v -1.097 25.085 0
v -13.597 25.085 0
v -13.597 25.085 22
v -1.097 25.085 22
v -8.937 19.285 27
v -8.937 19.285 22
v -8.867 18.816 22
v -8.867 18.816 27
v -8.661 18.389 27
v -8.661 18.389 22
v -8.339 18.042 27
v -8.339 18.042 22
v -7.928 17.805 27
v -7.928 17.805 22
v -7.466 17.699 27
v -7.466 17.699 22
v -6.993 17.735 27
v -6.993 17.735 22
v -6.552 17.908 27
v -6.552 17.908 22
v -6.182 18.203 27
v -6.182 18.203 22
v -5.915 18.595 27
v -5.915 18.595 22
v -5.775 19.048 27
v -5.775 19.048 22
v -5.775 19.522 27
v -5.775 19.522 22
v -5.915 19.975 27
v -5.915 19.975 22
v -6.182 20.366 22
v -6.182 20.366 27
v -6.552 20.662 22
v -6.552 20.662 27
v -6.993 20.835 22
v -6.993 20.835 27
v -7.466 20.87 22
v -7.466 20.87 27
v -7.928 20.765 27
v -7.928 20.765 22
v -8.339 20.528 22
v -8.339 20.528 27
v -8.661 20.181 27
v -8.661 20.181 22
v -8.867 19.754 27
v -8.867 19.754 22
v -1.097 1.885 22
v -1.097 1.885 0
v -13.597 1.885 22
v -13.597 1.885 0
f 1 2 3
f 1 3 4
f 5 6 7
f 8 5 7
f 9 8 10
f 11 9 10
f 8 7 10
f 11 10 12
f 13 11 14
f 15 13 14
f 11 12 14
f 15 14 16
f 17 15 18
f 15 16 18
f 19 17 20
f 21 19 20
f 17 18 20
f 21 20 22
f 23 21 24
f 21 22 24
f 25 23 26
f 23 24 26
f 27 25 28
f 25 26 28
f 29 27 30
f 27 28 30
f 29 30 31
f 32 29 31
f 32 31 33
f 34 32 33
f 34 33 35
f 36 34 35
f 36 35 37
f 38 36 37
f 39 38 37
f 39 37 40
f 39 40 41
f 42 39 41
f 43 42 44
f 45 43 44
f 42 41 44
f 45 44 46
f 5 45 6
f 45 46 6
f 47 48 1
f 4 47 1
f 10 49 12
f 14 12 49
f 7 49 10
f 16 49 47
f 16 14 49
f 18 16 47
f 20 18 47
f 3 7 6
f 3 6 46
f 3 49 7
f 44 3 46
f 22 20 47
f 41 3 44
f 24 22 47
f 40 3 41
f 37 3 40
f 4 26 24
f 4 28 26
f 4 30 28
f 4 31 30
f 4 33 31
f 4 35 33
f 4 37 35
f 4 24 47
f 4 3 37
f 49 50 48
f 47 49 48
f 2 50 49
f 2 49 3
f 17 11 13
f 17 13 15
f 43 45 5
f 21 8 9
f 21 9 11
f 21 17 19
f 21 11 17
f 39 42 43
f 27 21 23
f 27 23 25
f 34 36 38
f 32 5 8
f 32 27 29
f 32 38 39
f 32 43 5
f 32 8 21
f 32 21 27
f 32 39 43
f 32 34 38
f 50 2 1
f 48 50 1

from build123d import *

# Parameters (mm, degrees)
F0_W     = 12.5
F0_H     = 23.2
F1_DEPTH = 22
F3_DEPTH = 5


with BuildPart() as f1:
    # F0 (on Top) → F1 (new body)
    with BuildSketch(Plane.XY):
        with Locations((-7.3471718132, 13.4849312573)):
            Rectangle(F0_W, F0_H)
    extrude(amount=F1_DEPTH)

    # F2 (on face) → F3 (join)
    with BuildSketch(Plane.XY.offset(22)):
        with BuildLine():
            ThreePointArc((-5.7571718132, 19.2849312573), (-7.3471718132, 20.8749312573), (-8.9371718132, 19.2849312573))
            Line((-8.9371718132, 19.2849312573), (-5.7571718132, 19.2849312573))
        make_face()
        with BuildLine():
            Line((-5.7571718132, 19.2849312573), (-8.9371718132, 19.2849312573))
            ThreePointArc((-8.9371718132, 19.2849312573), (-7.3471718132, 17.6949312573), (-5.7571718132, 19.2849312573))
        make_face()
    extrude(amount=F3_DEPTH)


solid = f1.part
